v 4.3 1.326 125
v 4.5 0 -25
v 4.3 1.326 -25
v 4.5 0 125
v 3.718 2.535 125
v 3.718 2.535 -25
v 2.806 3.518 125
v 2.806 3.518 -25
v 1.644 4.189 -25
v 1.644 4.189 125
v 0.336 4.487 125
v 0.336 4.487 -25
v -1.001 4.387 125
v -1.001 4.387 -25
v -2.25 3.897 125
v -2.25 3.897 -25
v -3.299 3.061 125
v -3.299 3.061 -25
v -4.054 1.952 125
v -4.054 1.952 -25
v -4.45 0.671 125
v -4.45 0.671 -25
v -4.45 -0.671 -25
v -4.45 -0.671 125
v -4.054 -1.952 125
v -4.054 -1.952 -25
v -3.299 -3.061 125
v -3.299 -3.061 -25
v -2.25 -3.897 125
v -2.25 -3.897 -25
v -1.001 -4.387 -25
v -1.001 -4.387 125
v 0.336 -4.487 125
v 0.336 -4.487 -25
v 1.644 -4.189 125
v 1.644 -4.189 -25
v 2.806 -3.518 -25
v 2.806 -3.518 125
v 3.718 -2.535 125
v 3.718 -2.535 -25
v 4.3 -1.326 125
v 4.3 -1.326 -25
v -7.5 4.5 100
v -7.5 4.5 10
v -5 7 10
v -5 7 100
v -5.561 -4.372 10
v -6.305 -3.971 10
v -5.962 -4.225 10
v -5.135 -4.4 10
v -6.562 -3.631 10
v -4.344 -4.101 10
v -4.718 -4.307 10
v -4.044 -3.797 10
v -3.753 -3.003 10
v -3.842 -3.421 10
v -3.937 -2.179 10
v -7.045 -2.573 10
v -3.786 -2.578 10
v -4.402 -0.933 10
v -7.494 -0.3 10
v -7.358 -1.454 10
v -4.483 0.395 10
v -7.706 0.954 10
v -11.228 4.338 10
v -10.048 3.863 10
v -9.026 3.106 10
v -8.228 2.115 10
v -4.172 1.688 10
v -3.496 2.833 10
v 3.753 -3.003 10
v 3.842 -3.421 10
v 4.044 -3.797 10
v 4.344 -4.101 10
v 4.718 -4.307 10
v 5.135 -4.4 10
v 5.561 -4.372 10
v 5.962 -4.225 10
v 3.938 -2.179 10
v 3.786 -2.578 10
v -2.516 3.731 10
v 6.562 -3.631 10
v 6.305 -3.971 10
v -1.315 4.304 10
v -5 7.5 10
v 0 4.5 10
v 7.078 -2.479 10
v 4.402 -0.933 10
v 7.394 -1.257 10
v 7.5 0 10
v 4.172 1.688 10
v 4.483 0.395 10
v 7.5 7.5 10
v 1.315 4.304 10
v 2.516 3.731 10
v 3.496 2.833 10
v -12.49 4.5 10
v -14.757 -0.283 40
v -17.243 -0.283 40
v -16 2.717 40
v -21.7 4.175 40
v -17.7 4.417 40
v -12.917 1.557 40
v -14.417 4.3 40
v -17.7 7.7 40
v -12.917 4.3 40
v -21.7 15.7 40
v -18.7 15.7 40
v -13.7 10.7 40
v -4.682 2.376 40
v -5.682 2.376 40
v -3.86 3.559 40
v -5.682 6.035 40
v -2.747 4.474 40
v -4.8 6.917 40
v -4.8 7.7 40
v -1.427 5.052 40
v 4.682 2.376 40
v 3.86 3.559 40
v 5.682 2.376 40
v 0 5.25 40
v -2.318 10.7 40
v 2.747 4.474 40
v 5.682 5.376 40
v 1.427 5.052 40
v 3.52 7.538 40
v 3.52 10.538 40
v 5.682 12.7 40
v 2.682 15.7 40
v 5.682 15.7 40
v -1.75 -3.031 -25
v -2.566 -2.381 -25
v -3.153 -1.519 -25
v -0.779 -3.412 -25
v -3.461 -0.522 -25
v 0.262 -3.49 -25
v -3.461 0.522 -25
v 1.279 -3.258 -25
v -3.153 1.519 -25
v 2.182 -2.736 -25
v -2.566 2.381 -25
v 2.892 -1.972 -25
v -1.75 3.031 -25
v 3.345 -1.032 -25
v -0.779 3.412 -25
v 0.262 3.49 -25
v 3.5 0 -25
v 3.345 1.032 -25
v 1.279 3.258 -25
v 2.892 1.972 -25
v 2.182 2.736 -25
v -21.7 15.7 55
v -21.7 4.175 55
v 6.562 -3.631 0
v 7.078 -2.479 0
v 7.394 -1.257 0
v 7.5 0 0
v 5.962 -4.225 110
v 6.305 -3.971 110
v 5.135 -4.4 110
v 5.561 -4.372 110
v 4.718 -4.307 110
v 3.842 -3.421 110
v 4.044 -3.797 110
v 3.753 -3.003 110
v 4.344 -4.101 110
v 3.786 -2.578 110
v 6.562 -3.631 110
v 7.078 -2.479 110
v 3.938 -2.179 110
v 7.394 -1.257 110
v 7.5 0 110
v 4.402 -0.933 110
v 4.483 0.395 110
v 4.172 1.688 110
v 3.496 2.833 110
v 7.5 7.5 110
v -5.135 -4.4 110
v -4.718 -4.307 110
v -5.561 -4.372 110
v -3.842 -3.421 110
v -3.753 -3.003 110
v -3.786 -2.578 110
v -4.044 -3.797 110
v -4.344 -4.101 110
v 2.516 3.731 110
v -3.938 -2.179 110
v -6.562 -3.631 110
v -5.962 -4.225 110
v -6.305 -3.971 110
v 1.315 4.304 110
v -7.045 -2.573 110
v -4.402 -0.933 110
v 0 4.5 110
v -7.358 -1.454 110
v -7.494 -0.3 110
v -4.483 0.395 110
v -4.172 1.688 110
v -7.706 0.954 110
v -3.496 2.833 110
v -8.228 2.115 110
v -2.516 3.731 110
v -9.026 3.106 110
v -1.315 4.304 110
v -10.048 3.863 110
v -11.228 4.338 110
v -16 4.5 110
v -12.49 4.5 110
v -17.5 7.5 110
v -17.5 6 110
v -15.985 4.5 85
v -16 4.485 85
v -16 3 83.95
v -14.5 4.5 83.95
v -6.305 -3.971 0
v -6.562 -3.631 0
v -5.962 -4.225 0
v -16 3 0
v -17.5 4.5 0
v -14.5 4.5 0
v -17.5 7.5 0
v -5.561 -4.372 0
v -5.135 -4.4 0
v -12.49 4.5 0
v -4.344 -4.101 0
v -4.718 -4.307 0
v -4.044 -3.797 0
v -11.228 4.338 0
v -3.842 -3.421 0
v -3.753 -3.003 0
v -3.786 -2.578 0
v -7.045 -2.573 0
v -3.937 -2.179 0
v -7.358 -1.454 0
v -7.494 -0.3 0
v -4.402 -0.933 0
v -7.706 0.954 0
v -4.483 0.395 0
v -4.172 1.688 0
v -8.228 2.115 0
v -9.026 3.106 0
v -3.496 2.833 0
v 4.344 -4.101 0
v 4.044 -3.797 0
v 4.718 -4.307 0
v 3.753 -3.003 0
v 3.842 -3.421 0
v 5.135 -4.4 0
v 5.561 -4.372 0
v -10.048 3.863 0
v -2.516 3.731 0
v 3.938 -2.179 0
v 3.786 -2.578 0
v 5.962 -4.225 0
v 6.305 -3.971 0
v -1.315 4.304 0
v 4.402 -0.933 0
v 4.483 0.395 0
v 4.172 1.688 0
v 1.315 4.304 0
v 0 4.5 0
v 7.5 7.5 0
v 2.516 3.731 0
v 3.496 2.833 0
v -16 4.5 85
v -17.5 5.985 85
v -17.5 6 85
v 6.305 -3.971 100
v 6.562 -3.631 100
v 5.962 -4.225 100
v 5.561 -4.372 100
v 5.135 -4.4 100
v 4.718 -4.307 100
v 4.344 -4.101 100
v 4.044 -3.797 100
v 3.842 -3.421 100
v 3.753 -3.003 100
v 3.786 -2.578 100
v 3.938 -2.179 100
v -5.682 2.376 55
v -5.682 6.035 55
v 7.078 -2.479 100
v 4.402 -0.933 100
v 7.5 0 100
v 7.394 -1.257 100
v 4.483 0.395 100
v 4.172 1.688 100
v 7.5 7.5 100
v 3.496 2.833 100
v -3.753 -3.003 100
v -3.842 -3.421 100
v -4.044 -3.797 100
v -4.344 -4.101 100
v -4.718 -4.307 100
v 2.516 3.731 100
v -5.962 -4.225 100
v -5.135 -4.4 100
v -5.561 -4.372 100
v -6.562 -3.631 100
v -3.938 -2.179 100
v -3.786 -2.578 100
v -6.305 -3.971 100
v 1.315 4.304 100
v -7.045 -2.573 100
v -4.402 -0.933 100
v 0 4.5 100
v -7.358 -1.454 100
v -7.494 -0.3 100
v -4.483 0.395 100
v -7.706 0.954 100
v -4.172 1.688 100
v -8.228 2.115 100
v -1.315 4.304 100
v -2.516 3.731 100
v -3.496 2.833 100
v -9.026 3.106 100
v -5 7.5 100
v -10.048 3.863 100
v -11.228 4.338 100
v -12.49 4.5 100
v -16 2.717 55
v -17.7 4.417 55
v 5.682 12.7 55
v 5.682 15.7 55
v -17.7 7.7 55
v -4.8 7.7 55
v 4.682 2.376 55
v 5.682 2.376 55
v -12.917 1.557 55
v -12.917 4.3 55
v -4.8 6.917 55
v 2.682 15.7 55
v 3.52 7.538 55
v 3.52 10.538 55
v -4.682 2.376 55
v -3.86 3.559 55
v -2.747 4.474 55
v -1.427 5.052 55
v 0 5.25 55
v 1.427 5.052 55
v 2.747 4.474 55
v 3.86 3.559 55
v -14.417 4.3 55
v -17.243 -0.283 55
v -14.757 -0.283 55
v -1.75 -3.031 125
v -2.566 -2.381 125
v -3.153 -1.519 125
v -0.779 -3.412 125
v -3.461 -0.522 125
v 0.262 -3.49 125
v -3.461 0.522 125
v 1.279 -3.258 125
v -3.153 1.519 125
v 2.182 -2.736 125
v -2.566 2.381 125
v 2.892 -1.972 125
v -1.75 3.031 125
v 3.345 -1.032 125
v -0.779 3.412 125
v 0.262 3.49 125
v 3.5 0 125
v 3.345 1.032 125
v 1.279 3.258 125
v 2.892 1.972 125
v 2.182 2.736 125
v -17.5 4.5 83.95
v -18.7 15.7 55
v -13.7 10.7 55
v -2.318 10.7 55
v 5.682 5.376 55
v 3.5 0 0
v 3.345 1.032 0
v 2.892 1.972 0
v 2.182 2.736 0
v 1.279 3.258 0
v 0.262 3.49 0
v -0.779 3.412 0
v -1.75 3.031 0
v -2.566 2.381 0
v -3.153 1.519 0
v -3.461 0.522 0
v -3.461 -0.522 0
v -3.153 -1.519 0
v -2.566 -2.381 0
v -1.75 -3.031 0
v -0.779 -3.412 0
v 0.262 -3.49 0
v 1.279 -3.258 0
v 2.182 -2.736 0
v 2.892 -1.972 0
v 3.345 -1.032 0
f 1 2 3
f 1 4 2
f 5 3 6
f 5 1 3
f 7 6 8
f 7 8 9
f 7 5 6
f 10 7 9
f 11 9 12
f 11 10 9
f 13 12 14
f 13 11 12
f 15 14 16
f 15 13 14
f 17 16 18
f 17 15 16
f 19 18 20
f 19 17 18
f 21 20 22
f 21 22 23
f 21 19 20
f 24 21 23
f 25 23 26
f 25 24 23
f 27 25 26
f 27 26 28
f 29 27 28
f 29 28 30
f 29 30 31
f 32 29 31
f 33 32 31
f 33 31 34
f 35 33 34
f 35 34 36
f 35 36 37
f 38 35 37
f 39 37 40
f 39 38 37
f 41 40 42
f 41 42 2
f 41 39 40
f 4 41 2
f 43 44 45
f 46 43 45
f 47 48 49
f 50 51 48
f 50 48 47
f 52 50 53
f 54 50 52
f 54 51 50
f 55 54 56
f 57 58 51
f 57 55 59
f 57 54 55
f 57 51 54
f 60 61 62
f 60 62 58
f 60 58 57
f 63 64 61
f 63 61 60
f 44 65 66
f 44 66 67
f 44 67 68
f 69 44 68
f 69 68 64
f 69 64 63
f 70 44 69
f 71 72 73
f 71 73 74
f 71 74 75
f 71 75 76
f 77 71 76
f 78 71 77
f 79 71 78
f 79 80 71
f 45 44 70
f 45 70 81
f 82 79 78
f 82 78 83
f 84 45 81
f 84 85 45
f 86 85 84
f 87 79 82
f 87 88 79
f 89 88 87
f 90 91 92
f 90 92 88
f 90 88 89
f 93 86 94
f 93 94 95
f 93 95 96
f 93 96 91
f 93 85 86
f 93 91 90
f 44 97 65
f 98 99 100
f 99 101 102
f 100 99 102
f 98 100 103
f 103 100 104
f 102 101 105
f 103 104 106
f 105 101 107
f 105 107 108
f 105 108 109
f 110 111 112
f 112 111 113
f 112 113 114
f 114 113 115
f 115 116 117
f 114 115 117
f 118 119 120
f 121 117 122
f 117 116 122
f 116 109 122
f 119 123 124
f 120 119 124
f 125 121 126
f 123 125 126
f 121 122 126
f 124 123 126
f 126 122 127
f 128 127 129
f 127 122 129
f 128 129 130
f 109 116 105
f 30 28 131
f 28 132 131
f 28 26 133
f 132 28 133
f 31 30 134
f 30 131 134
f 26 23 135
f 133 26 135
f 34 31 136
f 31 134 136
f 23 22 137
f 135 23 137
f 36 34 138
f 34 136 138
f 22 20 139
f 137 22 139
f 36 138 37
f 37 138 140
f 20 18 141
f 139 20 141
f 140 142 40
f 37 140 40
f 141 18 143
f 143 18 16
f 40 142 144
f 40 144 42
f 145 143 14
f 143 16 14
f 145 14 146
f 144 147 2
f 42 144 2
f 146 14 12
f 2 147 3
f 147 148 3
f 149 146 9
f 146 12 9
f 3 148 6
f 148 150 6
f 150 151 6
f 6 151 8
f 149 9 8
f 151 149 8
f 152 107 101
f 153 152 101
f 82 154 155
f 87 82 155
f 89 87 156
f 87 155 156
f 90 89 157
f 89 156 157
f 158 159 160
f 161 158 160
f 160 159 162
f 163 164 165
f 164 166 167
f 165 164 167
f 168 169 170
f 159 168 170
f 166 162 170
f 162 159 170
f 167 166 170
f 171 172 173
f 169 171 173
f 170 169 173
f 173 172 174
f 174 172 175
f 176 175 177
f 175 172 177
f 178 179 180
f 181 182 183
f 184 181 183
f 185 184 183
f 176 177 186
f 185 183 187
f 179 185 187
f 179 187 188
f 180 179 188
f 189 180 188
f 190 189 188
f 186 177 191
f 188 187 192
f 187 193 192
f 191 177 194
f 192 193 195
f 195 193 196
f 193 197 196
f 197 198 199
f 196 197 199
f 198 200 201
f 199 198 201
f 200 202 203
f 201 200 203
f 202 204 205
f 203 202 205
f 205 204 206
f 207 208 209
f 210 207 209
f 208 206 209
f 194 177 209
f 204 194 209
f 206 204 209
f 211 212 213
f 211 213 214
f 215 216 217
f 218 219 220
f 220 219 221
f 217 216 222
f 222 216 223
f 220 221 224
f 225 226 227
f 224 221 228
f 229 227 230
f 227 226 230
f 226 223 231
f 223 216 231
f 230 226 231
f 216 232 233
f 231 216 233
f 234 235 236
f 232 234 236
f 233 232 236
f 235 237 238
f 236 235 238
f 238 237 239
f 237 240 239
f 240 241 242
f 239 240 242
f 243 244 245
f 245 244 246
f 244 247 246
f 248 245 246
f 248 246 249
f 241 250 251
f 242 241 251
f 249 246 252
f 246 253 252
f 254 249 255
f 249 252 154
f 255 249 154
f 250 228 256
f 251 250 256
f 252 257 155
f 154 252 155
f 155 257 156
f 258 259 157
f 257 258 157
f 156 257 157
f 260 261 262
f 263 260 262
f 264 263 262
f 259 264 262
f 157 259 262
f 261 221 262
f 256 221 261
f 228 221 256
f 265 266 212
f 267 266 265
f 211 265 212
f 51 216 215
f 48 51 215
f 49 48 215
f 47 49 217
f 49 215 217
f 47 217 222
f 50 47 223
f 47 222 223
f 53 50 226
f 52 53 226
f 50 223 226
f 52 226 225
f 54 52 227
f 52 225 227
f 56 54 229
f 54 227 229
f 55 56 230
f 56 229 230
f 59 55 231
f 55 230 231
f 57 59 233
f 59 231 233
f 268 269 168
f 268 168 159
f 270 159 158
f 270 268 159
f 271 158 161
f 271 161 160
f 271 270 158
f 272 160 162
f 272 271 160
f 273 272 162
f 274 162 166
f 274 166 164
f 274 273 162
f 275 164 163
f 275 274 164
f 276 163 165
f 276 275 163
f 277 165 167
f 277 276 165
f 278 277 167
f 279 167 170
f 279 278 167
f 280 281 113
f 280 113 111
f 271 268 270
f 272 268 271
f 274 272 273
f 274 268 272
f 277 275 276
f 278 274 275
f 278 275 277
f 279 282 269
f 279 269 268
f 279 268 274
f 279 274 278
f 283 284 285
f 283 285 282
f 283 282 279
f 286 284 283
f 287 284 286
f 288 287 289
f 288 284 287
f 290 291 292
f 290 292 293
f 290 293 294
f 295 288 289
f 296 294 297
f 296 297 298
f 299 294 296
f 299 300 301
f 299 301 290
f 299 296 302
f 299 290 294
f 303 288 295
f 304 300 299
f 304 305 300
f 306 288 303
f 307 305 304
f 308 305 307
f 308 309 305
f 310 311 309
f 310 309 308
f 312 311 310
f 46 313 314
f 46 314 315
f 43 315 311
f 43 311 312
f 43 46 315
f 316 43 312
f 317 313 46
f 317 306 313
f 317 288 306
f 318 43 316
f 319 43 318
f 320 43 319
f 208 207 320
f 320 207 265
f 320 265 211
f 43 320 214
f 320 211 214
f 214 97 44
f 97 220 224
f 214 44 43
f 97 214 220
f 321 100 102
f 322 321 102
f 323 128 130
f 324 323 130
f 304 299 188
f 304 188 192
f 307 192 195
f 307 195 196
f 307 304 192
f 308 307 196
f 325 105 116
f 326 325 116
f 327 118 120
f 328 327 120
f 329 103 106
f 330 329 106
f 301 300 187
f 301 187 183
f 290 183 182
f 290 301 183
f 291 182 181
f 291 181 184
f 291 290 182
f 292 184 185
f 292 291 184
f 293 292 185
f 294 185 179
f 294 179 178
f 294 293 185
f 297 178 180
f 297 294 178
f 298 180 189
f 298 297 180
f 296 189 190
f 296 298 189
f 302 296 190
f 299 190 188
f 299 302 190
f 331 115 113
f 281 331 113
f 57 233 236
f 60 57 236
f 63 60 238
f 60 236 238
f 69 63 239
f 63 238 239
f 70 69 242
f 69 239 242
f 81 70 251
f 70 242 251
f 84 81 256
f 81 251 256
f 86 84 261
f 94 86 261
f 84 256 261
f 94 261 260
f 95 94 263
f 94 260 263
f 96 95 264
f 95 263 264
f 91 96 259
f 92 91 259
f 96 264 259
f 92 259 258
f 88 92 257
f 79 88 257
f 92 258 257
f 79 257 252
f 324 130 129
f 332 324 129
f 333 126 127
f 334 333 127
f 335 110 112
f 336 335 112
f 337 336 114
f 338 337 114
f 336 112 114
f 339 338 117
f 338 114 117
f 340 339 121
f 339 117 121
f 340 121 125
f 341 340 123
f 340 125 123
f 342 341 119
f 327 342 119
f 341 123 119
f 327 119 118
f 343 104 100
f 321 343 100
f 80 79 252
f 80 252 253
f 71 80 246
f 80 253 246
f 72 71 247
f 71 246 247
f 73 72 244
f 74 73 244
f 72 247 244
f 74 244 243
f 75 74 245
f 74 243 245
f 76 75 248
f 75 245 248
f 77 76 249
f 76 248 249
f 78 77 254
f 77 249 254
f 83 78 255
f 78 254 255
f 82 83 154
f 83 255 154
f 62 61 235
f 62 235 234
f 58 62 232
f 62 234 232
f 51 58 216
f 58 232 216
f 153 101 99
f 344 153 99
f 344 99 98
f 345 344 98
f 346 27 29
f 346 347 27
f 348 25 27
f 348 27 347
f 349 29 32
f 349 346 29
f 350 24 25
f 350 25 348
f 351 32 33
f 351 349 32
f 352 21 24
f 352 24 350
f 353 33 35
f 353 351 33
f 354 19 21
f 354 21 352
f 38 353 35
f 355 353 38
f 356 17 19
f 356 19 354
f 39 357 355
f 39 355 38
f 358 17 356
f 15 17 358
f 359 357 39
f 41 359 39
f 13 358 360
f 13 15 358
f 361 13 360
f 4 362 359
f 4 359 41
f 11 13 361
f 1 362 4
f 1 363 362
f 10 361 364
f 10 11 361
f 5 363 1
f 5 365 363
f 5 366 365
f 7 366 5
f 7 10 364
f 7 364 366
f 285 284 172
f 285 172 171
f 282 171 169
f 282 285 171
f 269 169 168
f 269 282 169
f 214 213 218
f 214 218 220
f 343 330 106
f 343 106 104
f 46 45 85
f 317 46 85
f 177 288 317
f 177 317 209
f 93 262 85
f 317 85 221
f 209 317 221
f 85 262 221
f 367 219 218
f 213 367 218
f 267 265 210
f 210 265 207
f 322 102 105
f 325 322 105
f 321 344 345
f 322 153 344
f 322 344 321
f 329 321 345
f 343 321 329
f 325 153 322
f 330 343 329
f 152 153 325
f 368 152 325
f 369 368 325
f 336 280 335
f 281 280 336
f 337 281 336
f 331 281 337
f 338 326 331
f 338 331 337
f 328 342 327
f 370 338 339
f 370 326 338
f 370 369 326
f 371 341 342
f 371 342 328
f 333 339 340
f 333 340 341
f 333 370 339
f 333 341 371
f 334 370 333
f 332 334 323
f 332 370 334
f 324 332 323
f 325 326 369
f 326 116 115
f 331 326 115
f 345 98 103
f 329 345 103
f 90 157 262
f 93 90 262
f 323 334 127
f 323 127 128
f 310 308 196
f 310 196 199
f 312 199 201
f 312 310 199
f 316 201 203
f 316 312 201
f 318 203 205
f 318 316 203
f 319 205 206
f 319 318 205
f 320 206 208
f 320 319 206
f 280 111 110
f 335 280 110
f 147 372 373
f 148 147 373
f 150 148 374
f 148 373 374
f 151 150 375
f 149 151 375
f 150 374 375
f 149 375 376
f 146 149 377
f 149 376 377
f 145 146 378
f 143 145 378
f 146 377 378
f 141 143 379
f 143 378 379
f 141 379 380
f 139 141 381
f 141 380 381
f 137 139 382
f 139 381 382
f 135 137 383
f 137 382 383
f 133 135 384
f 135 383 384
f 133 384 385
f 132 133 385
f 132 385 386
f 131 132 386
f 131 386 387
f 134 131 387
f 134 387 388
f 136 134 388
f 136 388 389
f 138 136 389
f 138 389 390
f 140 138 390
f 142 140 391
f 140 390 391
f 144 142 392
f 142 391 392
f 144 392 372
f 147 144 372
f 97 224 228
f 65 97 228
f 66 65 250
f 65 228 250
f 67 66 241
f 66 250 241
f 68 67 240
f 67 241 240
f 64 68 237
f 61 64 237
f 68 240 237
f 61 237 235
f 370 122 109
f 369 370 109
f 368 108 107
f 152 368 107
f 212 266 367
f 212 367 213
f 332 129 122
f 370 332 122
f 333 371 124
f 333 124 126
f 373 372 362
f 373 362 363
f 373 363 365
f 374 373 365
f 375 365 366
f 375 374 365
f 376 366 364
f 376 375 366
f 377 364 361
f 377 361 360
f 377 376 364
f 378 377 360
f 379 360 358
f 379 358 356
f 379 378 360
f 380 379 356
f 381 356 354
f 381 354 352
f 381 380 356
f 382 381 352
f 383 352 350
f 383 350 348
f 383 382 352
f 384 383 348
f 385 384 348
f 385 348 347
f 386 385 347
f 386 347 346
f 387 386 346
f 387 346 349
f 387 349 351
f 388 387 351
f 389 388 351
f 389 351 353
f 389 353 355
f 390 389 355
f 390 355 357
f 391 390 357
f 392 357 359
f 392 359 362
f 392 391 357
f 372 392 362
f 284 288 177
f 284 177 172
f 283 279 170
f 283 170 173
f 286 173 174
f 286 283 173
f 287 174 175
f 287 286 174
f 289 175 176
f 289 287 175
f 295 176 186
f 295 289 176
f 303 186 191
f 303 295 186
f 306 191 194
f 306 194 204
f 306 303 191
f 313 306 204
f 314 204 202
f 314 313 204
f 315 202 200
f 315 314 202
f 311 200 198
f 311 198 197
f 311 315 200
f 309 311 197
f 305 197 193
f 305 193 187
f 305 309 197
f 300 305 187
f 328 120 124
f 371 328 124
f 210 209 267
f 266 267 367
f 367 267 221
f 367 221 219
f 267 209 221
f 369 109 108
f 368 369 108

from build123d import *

# Parameters (mm, degrees)
F3_DEPTH      = 10
F4_START      = -100
F4_DEPTH      = 10
F5_DEPTH      = 110
F6_DEPTH      = 85
F7_T1_DEPTH   = 10
F7_T3_DEPTH   = 10
F1_R          = 4.5
F1_R_2        = 3.5
F8_DEPTH      = 125
F8_DEPTH_BACK = 25
F9_START      = 40
F9_DEPTH      = 15
F10_SIZE      = 1.5
F11_SIZE      = 1.05


# Not quite as in the source:
# - a fillet or chamfer that OpenCascade refuses, or shapes differently, is made with other operations: its cross-section is extruded or revolved along the edge and cut away or added
# - a feature names something its author has since deleted; it is built from what else it names


with BuildPart() as f3:
    # F0 (on Top) → F3 (new body)
    with BuildSketch(Plane.XY):
        Polygon((-14.5, 4.5), (-7.5, 4.5), (-5, 7), (-5, 7.5), (-17.5, 7.5), (-17.5, 4.5), align=None)
        with BuildLine():
            ThreePointArc((-7.5, 0), (-7.2618437741, -1.875), (-6.5625, -3.6309218871))
            ThreePointArc((-6.5625, -3.6309218871), (-4.5238156226, -4.2172375097), (-3.9375, -2.1785531322))
            ThreePointArc((-3.9375, -2.1785531322), (0, 4.5), (3.9375, -2.1785531322))
            ThreePointArc((3.9375, -2.1785531322), (4.5238156226, -4.2172375097), (6.5625, -3.6309218871))
            ThreePointArc((6.5625, -3.6309218871), (7.2618437741, -1.875), (7.5, 0))
            Line((7.5, 0), (7.5, 7.5))
            Line((7.5, 7.5), (-5, 7.5))
            Line((-5, 7.5), (-5, 7))
            Line((-5, 7), (-7.5, 4.5))
            Line((-7.5, 4.5), (-7.5, 0))
        make_face()
    extrude(amount=F3_DEPTH)



with BuildPart() as f4:
    # F3_face (on face) → F4 (new body)
    with BuildSketch(Plane(origin=(-2.7583074733, 3.5975142137, 0), x_dir=(1, 0, 0), z_dir=(0, 0, -1)).offset(F4_START)):
        with BuildLine():
            Line((-14.7416925267, -3.9024857863), (10.2583074733, -3.9024857863))
            Line((10.2583074733, -3.9024857863), (10.2583074733, 3.5975142137))
            ThreePointArc((10.2583074733, 3.5975142137), (10.0201512474, 5.4725142137), (9.3208074733, 7.2284361007))
            ThreePointArc((9.3208074733, 7.2284361007), (7.2821230959, 7.8147517233), (6.6958074733, 5.7760673459))
            ThreePointArc((6.6958074733, 5.7760673459), (2.7583074733, -0.9024857863), (-1.1791925267, 5.7760673459))
            ThreePointArc((-1.1791925267, 5.7760673459), (-1.7655081493, 7.8147517233), (-3.8041925267, 7.2284361007))
            ThreePointArc((-3.8041925267, 7.2284361007), (-4.5035363009, 5.4725142137), (-4.7416925267, 3.5975142137))
            Line((-4.7416925267, 3.5975142137), (-4.7416925267, -0.9024857863))
            Line((-4.7416925267, -0.9024857863), (-14.7416925267, -0.9024857863))
            Line((-14.7416925267, -0.9024857863), (-14.7416925267, -3.9024857863))
        make_face()
    extrude(amount=-F4_DEPTH)


with BuildPart() as f3_1:
    add(f3.part)

    add(f4.part)  # F5 merges F4
    # F0 (on Top) → F5 (join, through all)
    with BuildSketch(Plane.XY):
        Polygon((-14.5, 4.5), (-7.5, 4.5), (-5, 7), (-5, 7.5), (-17.5, 7.5), (-17.5, 4.5), align=None)
    extrude(amount=F5_DEPTH)

    # F0 (on Top) → F6 (join)
    with BuildSketch(Plane.XY):
        Polygon((-16, 3), (-14.5, 4.5), (-17.5, 4.5), align=None)
    extrude(amount=F6_DEPTH)

    # F7: fillet of radius 5 on 2 edges, made by hand

    # F7_s2 → F7_t1 (join)
    with BuildSketch(Plane.XY):
        with BuildLine():
            ThreePointArc((-12.4899959968, 4.5), (-9.0258943817, 3.1055512755), (-7.4939975981, -0.3))
            Line((-7.4939975981, -0.3), (-6.9943977582, -0.28))
            ThreePointArc((-6.9943977582, -0.28), (-7, 0), (-7, 4.5))
            Line((-7, 4.5), (-7.5, 5))
            Line((-7.5, 5), (-12.4899959968, 5))
            Line((-12.4899959968, 5), (-12.4899959968, 4.5))
        make_face()
    extrude(amount=F7_T1_DEPTH)

    # F7_s4 → F7_t3 (join)
    with BuildSketch(Plane.XY.offset(100)):
        with BuildLine():
            ThreePointArc((-7.4939975981, -0.3), (-9.0258943817, 3.1055512755), (-12.4899959968, 4.5))
            Line((-12.4899959968, 4.5), (-12.4899959968, 5))
            Line((-12.4899959968, 5), (-7.5, 5))
            Line((-7.5, 5), (-7, 4.5))
            ThreePointArc((-7, 4.5), (-7, 0), (-6.9943977582, -0.28))
            Line((-6.9943977582, -0.28), (-7.4939975981, -0.3))
        make_face()
    extrude(amount=F7_T3_DEPTH)

    # F10
    f10_edges = [f3_1.edges().sort_by_distance(p)[0] for p in [
        (-17.5, 4.5, 97.5),
    ]]
    chamfer(f10_edges, length=F10_SIZE)

    # F11
    f11_edges = [f3_1.edges().sort_by_distance(p)[0] for p in [
        (-16.75, 3.75, 85),
        (-15.25, 3.75, 85),
    ]]
    chamfer(f11_edges, length=F11_SIZE)


with BuildPart() as f8:
    # F1 (on Top) → F8 (new body, two sides)
    with BuildSketch(Plane.XY) as f8_sk:
        Circle(F1_R)
        Circle(F1_R_2, mode=Mode.SUBTRACT)
    extrude(amount=F8_DEPTH)
    extrude(f8_sk.sketch, amount=-F8_DEPTH_BACK)


with BuildPart() as f9:
    # F2 (on Top) → F9 (new body)
    with BuildSketch(Plane.XY.offset(F9_START)):
        with BuildLine():
            Line((-16, 2.7171572875), (-17.7, 4.4171572875))
            Line((-17.7, 4.4171572875), (-17.7, 7.7))
            Line((-17.7, 7.7), (-4.8, 7.7))
            Line((-4.8, 7.7), (-4.8, 6.9171572875))
            Line((-4.8, 6.9171572875), (-5.6816604165, 6.035496871))
            Line((-5.6816604165, 6.035496871), (-5.6816604165, 2.375827381))
            Line((-5.6816604165, 2.375827381), (-4.6816604165, 2.375827381))
            ThreePointArc((-4.6816604165, 2.375827381), (0, 5.25), (4.6816604165, 2.375827381))
            Line((4.6816604165, 2.375827381), (5.6816604165, 2.375827381))
            Line((5.6816604165, 2.375827381), (5.6816604165, 5.375827381))
            Line((5.6816604165, 5.375827381), (3.519574107, 7.5379136905))
            Line((3.519574107, 7.5379136905), (3.519574107, 10.5379136905))
            Line((3.519574107, 10.5379136905), (5.6816604165, 12.7))
            Line((5.6816604165, 12.7), (5.6816604165, 15.7))
            Line((5.6816604165, 15.7), (2.6816604165, 15.7))
            Line((2.6816604165, 15.7), (-2.3183395835, 10.7))
            Line((-2.3183395835, 10.7), (-13.7, 10.7))
            Line((-13.7, 10.7), (-18.7, 15.7))
            Line((-18.7, 15.7), (-21.7, 15.7))
            Line((-21.7, 15.7), (-21.7, 4.1745166004))
            Line((-21.7, 4.1745166004), (-17.2426406871, -0.2828427125))
            Line((-17.2426406871, -0.2828427125), (-14.7573593129, -0.2828427125))
            Line((-14.7573593129, -0.2828427125), (-12.9171572875, 1.5573593129))
            Line((-12.9171572875, 1.5573593129), (-12.9171572875, 4.3))
            Line((-12.9171572875, 4.3), (-14.4171572875, 4.3))
            Line((-14.4171572875, 4.3), (-16, 2.7171572875))
        make_face()
    extrude(amount=F9_DEPTH)


solid = Compound([f3_1.part, f8.part, f9.part])
